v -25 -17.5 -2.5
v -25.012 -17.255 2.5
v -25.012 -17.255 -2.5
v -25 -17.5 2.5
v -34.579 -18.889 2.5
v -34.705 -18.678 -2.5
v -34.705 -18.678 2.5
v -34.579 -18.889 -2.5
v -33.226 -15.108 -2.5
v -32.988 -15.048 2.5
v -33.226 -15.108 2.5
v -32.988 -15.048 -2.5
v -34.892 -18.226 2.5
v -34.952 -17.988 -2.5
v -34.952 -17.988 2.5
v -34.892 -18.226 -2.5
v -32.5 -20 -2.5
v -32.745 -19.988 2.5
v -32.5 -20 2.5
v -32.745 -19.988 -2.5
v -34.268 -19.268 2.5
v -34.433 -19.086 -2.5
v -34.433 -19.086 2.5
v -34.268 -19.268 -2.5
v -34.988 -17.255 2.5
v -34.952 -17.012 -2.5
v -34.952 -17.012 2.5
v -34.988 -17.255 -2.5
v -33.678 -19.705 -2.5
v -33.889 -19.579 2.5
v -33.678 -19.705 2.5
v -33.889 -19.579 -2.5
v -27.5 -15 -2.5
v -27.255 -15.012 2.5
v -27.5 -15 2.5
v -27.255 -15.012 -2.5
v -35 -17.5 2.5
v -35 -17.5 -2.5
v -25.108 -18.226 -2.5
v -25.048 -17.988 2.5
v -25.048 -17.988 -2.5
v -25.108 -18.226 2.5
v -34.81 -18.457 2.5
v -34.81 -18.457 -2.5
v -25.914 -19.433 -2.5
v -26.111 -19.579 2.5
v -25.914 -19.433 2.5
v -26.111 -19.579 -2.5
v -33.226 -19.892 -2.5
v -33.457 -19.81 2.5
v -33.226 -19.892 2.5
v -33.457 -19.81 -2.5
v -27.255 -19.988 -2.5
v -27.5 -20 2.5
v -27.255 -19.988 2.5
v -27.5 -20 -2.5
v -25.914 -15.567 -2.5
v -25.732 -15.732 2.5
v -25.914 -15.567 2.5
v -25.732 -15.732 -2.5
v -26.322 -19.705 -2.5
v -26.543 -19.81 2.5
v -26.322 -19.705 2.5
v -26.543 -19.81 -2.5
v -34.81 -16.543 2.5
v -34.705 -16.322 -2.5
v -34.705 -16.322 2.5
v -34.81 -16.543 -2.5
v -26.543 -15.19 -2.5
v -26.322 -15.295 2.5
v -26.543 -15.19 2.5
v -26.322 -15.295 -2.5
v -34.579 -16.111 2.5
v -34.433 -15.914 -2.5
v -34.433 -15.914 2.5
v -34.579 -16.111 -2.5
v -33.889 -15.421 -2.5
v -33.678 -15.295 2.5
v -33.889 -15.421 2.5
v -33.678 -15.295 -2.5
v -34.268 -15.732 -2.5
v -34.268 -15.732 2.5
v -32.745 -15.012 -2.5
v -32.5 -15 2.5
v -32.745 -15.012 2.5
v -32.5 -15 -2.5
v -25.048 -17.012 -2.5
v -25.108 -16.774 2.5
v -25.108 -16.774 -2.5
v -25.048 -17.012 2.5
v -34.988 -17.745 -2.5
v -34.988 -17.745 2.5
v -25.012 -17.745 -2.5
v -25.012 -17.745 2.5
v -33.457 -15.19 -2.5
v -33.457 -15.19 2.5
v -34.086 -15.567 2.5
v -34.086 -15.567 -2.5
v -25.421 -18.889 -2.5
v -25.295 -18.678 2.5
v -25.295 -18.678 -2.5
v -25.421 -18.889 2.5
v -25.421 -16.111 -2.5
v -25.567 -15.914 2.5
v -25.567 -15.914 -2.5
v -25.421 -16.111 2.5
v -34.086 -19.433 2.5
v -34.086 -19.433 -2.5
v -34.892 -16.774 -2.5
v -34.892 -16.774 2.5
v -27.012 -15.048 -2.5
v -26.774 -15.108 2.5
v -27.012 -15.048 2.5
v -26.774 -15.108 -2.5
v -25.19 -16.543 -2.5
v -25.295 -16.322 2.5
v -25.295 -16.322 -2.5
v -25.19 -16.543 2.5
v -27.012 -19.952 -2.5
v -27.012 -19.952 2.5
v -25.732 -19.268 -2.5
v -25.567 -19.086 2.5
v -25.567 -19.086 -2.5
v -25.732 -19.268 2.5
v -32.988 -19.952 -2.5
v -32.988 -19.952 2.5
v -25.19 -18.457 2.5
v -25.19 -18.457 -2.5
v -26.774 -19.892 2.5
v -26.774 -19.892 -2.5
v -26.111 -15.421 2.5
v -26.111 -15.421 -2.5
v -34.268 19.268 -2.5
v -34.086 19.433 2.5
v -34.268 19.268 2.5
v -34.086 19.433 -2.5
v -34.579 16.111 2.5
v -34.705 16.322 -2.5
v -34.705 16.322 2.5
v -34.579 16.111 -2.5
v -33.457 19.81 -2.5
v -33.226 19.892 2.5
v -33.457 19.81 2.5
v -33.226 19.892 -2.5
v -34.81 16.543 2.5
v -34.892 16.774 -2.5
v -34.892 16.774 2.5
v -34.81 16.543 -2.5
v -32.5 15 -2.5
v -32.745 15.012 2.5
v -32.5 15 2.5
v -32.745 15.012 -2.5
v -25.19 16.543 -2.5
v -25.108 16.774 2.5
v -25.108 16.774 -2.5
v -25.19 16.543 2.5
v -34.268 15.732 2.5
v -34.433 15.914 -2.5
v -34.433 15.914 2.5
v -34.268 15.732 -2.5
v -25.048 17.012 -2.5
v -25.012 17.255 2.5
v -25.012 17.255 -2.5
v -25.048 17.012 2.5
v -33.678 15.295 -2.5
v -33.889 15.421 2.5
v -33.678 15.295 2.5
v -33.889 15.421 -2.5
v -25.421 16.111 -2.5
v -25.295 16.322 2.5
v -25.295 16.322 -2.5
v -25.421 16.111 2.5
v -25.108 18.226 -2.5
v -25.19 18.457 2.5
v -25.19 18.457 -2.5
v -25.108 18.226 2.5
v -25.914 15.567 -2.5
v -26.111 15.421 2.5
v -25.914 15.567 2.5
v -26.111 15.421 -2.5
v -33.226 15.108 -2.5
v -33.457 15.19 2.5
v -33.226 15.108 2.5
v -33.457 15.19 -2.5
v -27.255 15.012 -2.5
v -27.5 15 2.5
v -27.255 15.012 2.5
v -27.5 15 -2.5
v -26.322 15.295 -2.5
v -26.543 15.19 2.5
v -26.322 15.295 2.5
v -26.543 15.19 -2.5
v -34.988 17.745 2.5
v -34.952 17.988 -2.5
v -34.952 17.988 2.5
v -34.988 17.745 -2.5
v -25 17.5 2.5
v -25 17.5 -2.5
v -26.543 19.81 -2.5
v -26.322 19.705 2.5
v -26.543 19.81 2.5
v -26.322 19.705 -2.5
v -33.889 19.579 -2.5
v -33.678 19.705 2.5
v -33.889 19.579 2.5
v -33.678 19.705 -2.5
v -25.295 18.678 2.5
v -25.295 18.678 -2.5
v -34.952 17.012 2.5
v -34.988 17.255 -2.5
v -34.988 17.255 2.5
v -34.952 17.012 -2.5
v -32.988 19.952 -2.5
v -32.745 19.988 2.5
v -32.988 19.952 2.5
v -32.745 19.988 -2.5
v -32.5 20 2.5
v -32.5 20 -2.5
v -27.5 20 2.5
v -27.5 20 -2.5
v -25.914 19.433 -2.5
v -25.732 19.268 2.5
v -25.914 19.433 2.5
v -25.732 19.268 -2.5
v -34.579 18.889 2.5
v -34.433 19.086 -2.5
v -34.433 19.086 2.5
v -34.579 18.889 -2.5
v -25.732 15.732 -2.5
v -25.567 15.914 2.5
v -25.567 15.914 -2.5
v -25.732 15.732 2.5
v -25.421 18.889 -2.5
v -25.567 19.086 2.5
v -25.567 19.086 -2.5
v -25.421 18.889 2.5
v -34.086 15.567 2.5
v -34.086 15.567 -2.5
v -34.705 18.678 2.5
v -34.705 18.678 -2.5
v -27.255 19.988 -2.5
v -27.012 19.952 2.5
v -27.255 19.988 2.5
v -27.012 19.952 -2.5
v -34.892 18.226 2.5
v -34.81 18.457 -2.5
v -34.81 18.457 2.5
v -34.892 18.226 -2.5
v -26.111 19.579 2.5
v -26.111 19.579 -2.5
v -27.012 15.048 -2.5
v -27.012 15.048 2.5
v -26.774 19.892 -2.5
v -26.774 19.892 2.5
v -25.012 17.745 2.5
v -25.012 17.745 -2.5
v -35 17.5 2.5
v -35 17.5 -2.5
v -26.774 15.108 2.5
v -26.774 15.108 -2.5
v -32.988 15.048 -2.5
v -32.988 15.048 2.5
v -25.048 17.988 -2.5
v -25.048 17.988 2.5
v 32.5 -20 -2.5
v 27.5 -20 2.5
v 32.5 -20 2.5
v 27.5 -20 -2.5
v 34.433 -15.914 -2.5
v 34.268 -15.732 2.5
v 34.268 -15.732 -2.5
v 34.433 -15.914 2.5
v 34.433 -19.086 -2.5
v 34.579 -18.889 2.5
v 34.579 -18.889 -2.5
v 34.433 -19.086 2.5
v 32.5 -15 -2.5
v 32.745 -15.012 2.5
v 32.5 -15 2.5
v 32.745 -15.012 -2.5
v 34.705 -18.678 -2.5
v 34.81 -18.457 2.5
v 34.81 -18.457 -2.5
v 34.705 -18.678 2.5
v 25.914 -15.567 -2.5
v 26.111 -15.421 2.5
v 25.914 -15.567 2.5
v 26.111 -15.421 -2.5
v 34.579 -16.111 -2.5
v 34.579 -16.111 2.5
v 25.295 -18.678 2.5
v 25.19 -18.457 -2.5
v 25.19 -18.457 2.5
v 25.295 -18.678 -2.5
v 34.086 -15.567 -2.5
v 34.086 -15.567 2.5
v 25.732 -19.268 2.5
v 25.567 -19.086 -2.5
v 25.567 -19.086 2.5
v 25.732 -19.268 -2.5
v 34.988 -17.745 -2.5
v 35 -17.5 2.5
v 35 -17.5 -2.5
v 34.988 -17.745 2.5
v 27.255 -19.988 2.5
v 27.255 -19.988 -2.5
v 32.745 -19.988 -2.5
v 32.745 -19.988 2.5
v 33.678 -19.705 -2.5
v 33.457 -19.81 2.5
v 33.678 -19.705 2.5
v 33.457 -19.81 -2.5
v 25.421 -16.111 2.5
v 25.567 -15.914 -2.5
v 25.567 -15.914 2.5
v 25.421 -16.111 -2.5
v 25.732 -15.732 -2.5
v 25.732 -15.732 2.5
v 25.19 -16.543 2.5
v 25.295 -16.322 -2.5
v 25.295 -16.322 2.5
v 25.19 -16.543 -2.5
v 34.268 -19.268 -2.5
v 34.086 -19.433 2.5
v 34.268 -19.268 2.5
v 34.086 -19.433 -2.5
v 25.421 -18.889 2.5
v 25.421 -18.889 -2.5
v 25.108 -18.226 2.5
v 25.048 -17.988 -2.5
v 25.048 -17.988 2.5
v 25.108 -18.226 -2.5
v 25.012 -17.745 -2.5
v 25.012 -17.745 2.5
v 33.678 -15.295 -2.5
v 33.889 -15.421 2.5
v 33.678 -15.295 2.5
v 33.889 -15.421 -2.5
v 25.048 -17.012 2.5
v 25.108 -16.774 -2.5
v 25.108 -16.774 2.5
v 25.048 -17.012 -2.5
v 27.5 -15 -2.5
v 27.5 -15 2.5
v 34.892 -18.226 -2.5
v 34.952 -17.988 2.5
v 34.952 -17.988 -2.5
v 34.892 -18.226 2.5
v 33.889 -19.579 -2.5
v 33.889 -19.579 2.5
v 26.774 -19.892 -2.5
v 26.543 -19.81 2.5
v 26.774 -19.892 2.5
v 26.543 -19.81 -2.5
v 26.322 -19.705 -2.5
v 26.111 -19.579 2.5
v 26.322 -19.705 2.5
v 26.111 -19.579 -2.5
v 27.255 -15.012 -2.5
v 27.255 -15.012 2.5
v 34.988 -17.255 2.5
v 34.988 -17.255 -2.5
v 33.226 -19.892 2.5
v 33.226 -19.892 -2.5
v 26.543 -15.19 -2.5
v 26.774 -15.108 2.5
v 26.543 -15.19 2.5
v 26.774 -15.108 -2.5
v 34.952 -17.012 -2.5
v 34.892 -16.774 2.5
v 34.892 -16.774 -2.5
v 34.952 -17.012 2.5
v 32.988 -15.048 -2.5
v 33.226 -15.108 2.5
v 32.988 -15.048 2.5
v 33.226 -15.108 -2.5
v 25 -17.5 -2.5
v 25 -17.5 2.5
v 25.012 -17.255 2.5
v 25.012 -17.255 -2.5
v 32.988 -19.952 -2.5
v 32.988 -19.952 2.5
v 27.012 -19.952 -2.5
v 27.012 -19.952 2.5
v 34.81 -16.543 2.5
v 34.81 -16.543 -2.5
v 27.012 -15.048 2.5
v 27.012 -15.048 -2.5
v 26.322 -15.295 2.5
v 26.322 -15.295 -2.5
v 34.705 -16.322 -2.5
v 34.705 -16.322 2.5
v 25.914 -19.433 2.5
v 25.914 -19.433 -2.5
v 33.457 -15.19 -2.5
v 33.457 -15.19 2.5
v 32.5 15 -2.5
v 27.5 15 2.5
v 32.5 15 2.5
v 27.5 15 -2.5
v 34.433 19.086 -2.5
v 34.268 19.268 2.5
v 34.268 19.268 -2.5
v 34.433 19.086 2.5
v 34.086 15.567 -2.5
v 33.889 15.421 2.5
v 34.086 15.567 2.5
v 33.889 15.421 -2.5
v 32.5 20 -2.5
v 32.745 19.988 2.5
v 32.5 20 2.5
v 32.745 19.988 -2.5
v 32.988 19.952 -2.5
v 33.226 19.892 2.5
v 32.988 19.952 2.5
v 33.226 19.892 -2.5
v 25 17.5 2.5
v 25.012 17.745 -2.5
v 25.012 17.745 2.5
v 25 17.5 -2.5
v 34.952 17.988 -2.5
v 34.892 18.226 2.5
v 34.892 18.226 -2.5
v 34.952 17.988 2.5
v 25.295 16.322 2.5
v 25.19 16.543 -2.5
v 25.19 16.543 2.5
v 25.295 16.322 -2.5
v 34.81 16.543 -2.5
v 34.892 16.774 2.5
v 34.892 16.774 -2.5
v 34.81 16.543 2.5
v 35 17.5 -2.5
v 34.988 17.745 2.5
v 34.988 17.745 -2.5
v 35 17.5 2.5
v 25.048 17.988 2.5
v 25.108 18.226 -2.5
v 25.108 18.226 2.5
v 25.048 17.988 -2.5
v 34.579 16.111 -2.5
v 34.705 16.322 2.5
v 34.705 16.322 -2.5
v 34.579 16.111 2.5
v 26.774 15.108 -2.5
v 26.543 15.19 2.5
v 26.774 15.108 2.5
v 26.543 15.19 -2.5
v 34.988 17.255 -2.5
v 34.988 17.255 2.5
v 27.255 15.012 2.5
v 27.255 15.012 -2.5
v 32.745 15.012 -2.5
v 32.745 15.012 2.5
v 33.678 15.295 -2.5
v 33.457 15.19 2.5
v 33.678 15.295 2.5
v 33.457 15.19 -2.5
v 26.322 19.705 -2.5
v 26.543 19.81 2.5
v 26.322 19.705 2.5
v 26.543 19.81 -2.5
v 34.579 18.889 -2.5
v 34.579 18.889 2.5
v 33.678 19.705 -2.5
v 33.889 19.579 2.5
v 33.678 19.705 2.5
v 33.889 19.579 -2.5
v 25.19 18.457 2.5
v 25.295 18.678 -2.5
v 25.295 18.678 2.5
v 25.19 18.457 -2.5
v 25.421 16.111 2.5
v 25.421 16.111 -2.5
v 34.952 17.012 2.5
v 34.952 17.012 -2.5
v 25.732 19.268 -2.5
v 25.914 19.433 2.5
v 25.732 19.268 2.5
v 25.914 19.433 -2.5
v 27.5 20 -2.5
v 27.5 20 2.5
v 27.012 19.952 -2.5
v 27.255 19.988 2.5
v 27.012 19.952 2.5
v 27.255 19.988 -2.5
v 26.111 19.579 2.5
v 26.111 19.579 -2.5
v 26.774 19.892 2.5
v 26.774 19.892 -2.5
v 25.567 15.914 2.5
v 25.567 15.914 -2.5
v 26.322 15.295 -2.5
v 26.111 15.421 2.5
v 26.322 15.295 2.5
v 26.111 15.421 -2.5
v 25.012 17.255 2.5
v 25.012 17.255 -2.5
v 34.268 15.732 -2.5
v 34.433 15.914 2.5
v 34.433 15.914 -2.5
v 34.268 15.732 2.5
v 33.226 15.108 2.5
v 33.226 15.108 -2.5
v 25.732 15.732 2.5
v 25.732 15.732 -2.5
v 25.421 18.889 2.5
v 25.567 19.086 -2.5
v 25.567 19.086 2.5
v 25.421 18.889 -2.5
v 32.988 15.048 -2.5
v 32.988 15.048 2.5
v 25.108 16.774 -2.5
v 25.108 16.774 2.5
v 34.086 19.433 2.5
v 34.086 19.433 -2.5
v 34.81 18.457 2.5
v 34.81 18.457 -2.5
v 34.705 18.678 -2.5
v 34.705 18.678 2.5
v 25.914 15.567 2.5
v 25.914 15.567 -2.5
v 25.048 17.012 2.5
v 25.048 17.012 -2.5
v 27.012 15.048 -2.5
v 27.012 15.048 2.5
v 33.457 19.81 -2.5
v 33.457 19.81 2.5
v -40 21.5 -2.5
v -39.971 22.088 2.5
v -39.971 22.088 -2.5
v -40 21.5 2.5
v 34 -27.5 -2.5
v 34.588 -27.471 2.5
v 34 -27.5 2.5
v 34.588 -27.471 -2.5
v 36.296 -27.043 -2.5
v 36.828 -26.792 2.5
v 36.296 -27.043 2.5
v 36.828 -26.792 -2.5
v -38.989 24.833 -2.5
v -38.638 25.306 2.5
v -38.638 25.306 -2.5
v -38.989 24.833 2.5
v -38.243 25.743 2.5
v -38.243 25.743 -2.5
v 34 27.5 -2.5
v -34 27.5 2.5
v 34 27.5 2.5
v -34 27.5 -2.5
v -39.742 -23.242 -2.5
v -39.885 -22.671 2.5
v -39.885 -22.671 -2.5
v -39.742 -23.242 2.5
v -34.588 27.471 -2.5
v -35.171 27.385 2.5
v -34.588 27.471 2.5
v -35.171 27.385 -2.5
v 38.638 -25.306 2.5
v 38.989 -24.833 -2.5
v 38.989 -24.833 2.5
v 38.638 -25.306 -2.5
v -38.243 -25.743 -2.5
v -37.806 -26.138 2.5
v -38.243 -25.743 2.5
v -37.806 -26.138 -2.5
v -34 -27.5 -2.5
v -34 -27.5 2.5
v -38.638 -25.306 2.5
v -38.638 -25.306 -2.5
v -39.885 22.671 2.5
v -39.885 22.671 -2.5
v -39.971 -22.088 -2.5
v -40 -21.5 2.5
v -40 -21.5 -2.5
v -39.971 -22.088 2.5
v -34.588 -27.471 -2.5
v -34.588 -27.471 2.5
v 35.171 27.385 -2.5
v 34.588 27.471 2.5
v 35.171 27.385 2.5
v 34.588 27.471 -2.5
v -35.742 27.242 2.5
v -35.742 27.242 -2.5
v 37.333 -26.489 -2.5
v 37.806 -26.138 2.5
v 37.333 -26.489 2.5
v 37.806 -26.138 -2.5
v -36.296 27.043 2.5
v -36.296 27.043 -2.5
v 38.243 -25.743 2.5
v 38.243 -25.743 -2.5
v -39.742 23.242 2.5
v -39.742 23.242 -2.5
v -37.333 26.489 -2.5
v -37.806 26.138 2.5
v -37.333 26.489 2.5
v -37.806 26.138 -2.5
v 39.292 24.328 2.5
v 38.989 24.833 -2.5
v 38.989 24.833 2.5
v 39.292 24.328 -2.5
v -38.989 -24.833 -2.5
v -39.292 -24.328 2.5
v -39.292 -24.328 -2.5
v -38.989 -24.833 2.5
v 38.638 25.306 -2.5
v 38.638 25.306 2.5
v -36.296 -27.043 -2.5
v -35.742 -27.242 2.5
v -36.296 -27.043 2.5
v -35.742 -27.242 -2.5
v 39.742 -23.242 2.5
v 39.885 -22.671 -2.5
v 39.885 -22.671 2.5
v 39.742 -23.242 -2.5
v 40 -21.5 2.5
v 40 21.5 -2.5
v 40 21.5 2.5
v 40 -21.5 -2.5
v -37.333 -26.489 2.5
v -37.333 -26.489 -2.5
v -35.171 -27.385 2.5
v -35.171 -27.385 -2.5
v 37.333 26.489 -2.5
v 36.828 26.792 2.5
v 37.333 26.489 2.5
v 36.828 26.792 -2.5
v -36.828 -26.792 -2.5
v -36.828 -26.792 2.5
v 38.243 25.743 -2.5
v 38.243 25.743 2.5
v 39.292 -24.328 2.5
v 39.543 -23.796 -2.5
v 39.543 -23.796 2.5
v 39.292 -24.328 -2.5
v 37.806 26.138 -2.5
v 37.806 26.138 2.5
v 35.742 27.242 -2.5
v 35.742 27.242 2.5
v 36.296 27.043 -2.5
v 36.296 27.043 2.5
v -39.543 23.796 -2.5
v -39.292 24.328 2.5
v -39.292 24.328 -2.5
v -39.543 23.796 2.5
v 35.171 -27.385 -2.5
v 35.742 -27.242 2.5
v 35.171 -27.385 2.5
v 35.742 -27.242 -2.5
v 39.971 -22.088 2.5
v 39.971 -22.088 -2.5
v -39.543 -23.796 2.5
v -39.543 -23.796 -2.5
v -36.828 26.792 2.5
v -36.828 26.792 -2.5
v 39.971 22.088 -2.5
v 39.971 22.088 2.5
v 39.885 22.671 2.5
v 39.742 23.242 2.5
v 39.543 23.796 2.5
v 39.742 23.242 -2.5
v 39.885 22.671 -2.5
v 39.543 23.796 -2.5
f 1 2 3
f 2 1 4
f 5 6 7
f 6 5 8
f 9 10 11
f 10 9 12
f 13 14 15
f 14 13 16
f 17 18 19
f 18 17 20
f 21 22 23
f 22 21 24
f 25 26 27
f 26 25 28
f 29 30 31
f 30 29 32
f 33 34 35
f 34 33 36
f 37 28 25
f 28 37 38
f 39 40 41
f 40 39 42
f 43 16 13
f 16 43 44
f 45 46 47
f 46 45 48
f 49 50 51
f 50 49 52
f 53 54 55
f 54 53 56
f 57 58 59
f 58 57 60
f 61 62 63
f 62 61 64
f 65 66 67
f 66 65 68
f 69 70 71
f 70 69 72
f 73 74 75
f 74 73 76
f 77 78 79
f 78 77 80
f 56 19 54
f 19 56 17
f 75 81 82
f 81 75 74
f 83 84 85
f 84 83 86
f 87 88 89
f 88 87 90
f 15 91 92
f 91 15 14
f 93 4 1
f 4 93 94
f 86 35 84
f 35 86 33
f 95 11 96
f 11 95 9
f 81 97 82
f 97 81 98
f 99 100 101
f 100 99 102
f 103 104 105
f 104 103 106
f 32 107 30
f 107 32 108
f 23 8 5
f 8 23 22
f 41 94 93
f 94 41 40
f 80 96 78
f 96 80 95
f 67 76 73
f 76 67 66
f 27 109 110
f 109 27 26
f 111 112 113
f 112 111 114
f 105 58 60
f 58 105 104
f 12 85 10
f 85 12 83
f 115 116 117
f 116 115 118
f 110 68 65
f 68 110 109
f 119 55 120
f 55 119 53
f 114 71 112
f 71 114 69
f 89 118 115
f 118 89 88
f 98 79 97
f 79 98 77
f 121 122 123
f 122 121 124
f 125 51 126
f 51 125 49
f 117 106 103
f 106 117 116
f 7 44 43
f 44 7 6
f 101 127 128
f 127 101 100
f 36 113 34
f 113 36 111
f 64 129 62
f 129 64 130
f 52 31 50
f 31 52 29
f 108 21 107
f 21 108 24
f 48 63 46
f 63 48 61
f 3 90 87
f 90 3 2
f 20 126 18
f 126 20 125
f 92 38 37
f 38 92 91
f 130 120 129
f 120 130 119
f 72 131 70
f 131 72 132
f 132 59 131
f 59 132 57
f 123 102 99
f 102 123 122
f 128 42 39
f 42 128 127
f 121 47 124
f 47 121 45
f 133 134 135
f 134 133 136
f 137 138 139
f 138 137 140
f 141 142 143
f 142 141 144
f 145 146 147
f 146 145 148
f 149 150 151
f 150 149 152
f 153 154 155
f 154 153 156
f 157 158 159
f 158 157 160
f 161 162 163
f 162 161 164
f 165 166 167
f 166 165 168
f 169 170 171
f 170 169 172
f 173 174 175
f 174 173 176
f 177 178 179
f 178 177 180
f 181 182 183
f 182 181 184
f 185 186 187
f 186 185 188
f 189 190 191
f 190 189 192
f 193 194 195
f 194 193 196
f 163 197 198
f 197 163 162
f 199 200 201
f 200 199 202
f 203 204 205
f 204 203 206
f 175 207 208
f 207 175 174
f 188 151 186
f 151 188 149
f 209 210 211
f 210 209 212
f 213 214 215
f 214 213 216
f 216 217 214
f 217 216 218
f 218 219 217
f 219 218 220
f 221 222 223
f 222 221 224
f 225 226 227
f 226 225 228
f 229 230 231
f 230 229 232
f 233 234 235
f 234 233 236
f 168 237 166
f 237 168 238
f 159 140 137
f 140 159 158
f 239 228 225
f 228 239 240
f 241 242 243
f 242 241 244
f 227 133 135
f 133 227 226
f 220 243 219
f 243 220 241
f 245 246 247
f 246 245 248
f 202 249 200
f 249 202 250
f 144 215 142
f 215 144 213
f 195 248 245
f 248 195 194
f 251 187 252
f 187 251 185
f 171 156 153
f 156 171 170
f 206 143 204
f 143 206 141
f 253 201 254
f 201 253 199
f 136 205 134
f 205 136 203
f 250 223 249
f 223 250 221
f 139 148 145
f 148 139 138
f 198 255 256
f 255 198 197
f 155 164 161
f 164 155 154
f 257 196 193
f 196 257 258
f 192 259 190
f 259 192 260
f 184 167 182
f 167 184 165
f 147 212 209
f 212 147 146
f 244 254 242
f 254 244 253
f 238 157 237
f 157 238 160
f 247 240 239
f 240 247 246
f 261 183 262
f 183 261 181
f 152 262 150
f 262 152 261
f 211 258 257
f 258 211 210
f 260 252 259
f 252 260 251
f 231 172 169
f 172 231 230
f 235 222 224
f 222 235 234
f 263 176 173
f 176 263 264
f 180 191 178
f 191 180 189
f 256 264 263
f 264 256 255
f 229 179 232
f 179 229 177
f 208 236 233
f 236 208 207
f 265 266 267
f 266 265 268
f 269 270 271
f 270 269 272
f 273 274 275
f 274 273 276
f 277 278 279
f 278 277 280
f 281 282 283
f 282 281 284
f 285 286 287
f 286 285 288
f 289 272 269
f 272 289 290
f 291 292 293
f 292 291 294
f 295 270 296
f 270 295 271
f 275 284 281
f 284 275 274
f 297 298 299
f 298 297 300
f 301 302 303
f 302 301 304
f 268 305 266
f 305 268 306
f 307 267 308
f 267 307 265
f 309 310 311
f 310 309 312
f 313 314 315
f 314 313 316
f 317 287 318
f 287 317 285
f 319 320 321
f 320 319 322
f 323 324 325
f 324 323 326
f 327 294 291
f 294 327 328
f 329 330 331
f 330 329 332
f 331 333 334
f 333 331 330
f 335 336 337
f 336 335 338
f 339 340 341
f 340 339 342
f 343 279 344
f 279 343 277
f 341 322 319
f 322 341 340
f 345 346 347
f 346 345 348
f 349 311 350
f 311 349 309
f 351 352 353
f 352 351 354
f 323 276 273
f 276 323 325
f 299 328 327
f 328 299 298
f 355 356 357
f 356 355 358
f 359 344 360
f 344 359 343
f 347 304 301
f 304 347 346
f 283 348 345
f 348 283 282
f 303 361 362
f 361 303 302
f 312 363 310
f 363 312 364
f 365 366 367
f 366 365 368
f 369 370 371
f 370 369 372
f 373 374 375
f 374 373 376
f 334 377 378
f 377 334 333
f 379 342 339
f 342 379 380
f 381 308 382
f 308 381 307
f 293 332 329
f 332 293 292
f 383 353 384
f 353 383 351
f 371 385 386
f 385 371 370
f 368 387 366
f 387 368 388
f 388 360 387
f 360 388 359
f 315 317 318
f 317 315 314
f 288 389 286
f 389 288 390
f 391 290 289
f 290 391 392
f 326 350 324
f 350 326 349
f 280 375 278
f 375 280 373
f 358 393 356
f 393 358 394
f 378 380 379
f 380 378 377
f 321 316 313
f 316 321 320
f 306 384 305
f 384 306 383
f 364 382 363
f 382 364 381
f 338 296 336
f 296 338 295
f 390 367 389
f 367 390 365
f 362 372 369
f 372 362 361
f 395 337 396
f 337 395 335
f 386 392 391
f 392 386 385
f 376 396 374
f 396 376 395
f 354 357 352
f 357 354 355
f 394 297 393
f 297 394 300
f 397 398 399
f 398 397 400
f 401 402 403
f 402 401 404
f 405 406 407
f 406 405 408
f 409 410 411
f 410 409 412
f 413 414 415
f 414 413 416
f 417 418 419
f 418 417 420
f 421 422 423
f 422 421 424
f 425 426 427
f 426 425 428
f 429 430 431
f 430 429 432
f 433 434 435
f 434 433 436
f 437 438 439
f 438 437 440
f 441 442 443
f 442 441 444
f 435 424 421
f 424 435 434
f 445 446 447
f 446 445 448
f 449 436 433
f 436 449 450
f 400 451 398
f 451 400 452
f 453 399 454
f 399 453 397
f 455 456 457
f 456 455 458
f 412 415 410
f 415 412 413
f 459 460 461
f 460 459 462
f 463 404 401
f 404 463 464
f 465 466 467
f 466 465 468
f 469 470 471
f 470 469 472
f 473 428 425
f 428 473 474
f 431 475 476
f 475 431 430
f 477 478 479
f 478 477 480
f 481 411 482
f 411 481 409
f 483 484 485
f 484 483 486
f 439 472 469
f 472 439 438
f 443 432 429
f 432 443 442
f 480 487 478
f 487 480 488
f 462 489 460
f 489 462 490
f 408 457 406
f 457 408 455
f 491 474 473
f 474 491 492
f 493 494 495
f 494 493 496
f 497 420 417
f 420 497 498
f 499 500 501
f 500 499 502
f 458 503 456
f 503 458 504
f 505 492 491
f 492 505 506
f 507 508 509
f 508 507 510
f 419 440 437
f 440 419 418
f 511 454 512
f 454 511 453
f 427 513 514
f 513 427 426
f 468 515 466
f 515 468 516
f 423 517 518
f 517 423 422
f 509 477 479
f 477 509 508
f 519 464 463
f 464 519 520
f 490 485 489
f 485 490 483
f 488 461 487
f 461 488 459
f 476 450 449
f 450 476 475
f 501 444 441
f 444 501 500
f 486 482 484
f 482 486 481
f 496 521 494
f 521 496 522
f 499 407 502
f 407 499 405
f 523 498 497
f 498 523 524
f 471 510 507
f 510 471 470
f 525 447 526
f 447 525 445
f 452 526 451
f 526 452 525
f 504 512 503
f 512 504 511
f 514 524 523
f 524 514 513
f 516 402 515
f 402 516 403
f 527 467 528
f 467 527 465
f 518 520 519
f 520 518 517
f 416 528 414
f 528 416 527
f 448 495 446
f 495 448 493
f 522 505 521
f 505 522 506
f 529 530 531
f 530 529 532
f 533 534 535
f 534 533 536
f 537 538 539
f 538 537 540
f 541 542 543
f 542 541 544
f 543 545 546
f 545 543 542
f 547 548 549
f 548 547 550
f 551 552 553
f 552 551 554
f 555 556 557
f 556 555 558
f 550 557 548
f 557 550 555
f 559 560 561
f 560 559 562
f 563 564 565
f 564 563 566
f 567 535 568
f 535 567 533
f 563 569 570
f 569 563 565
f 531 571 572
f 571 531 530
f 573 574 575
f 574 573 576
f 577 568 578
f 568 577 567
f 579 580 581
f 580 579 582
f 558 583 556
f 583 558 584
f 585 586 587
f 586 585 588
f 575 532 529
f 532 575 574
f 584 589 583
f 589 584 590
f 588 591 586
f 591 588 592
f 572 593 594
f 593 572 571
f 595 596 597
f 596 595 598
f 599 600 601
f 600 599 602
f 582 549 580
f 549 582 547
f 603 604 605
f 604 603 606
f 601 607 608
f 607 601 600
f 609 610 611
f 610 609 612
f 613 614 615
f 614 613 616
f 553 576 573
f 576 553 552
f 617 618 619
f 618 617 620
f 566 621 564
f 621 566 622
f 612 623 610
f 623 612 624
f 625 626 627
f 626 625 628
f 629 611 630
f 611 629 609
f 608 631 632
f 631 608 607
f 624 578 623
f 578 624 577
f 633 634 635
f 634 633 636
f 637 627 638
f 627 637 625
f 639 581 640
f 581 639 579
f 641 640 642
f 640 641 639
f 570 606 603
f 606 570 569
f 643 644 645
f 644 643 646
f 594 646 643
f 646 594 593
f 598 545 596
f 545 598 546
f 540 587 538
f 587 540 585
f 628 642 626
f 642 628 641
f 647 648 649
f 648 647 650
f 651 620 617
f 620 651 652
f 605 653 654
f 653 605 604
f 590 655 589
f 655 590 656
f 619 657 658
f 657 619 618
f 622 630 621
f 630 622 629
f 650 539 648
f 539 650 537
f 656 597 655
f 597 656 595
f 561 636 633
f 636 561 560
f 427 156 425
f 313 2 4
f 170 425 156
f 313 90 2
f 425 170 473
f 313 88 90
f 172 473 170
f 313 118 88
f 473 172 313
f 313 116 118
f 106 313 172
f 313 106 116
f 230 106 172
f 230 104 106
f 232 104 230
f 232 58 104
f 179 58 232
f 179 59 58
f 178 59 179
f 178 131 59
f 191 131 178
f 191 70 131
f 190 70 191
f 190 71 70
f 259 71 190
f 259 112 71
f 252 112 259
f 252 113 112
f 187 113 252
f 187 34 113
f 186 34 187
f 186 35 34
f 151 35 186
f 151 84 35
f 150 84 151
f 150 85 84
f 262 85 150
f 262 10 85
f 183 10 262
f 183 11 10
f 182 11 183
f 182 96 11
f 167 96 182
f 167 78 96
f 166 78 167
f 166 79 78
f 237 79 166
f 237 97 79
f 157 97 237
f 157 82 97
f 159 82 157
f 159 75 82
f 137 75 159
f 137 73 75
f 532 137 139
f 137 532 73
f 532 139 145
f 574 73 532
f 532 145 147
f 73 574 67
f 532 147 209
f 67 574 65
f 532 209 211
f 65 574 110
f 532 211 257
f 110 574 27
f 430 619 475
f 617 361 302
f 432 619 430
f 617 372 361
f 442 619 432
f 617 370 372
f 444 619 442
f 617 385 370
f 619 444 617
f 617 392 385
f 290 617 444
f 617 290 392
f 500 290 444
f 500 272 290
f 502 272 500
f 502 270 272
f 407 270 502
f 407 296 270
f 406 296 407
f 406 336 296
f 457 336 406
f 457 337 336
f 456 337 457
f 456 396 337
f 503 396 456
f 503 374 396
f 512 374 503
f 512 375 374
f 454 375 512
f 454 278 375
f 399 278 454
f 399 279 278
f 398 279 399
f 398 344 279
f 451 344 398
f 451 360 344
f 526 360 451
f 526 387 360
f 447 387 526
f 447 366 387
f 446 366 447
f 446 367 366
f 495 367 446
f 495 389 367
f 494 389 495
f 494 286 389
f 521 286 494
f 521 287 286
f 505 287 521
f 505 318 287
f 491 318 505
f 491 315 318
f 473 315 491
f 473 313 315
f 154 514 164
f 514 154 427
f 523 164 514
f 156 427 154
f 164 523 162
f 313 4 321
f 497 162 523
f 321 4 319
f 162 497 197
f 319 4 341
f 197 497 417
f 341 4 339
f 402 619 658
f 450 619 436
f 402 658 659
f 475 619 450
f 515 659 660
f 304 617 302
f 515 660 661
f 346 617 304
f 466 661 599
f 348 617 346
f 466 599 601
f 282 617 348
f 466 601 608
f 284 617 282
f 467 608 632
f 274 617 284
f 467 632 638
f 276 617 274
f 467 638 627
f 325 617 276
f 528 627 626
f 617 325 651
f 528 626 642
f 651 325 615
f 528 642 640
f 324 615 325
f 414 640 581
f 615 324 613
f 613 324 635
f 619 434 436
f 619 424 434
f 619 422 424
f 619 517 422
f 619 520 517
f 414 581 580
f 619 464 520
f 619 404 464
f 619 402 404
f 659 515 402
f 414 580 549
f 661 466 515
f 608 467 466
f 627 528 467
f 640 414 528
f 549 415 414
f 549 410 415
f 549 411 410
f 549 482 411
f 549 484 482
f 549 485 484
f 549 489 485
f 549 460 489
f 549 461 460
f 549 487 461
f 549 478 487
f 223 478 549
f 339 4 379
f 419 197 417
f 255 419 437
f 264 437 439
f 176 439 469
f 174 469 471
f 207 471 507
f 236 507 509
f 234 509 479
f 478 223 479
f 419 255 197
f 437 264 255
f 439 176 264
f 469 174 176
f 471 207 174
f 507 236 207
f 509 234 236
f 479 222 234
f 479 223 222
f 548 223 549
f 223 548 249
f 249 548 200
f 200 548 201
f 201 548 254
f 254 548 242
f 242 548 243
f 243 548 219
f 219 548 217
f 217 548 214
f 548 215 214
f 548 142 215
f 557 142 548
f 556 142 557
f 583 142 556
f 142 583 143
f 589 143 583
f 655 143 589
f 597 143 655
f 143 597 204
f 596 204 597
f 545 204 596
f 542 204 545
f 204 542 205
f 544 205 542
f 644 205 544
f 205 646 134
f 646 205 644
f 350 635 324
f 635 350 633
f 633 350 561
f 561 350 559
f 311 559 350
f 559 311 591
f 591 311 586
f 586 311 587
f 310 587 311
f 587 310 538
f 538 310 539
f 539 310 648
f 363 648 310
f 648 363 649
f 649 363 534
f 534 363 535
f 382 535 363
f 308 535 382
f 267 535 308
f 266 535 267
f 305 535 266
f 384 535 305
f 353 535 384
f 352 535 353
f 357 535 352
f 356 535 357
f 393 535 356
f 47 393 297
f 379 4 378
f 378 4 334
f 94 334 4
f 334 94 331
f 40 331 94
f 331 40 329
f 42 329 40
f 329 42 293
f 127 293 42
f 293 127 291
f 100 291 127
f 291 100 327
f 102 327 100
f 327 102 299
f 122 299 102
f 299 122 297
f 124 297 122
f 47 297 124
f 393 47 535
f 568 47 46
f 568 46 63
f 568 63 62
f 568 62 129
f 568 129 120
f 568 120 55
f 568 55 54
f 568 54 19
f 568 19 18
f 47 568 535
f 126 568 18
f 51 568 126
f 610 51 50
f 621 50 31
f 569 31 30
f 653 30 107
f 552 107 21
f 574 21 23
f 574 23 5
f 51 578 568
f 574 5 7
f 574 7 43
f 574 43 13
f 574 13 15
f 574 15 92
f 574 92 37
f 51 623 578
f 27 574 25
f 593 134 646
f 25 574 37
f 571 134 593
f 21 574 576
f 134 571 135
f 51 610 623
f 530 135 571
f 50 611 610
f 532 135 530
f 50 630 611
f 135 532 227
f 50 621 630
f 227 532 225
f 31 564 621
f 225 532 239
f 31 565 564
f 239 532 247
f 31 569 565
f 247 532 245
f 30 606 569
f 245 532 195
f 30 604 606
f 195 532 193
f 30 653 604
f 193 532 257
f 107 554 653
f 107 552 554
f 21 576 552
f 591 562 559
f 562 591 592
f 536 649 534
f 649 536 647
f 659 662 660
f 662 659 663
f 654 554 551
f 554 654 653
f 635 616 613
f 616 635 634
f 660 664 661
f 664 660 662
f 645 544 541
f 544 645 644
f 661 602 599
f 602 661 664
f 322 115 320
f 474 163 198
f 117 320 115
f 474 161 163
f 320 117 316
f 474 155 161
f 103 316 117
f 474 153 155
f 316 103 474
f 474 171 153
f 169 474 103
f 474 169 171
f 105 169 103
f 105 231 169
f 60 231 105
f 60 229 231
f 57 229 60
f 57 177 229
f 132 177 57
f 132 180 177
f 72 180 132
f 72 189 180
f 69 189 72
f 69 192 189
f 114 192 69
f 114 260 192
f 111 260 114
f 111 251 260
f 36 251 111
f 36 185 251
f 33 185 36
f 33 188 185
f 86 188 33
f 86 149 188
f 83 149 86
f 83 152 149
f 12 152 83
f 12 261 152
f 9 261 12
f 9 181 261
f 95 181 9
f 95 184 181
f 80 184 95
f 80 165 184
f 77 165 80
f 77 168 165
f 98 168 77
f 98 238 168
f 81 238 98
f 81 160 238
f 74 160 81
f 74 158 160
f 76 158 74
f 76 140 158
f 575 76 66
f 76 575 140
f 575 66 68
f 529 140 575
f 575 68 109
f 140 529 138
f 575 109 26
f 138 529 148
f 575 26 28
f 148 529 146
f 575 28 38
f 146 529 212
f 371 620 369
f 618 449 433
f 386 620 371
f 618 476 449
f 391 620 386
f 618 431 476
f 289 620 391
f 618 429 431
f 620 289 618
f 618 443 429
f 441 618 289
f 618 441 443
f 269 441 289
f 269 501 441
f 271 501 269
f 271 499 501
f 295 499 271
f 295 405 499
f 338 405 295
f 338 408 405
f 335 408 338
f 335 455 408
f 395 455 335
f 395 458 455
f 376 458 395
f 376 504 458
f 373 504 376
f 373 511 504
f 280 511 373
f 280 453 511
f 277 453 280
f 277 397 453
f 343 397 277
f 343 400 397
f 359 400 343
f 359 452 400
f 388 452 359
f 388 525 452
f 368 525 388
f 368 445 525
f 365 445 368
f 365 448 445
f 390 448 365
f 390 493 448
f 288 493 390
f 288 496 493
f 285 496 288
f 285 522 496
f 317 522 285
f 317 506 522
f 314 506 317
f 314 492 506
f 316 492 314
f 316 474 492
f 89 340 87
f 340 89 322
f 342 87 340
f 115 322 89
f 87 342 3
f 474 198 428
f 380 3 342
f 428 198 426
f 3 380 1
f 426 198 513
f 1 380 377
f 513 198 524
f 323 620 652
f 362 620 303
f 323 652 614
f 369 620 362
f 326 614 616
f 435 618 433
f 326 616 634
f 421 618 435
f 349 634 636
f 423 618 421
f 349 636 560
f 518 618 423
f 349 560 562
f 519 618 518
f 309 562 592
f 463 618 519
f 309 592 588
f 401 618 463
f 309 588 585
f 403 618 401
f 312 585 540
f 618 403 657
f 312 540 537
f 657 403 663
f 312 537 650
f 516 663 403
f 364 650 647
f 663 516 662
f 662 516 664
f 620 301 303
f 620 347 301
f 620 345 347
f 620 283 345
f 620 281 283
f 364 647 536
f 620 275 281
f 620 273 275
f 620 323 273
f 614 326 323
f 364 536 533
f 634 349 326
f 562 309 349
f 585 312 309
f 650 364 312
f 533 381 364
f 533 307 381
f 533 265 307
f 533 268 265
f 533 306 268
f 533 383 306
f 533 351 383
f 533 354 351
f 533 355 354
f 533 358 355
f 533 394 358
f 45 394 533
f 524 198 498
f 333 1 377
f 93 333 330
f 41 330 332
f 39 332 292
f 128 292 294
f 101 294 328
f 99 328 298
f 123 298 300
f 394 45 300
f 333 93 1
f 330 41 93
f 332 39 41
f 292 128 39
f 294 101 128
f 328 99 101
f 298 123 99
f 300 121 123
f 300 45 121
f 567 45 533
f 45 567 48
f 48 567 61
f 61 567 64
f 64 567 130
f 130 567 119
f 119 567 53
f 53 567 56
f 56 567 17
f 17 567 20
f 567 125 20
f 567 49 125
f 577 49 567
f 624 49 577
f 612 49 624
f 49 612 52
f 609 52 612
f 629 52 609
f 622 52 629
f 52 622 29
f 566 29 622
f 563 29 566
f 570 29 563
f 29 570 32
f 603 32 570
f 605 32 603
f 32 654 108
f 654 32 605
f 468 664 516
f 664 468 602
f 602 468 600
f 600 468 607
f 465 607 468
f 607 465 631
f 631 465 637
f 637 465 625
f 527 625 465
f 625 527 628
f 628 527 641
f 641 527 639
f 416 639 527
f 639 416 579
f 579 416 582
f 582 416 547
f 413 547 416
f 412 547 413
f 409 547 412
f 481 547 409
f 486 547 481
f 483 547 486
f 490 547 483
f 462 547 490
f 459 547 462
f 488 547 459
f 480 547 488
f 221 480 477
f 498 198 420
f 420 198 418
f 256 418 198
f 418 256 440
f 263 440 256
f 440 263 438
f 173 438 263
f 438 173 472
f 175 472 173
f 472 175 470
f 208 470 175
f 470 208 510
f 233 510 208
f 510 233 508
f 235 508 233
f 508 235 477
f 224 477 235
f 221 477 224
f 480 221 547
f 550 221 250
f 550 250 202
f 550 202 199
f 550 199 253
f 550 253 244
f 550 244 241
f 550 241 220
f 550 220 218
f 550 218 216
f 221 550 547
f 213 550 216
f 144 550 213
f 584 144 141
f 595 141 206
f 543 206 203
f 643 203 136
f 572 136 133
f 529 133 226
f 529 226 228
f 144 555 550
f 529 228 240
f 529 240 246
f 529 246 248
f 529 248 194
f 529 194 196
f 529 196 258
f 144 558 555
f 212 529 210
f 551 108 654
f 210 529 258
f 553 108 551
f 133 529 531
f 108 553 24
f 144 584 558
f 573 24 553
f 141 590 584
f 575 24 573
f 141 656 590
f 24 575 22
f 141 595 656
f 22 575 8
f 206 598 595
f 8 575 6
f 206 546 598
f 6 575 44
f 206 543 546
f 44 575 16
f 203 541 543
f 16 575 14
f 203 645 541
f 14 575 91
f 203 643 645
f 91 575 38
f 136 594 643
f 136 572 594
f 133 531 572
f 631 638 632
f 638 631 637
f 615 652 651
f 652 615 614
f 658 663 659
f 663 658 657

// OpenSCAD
// file: ../toolbox.scad
// Reusable geometry and layout modules for the projects in this repository.
// All dimensions are in millimetres.

module tb_rounded_rect_2d(width = 50, length = 50, radius = 5) {
assert(width > 0, "Width must be greater than zero.");
assert(length > 0, "Length must be greater than zero.");
assert(radius >= 0, "Corner radius cannot be negative.");
assert(radius <= min(width, length) / 2,
"Corner radius is too large for these dimensions.");

if (radius > 0) {
    offset(r = radius)
        square(
            [width - 2 * radius, length - 2 * radius],
            center = true
        );
} else {
    square([width, length], center = true);
}

}

module tb_rounded_solid(
width = 50,
length = 50,
height = 5,
radius = 5,
center = true
) {
assert(height > 0, "Height must be greater than zero.");

linear_extrude(height = height, center = center)
    tb_rounded_rect_2d(
        width = width,
        length = length,
        radius = radius
    );

}

module tb_rounded_ring(
width = 50,
length = 50,
height = 5,
radius = 5,
wall = 2,
center = true,
epsilon = 0.02
) {
assert(wall > 0, "Wall thickness must be greater than zero.");
assert(width > 2 * wall, "Wall is too large for the width.");
assert(length > 2 * wall, "Wall is too large for the length.");

difference() {
    tb_rounded_solid(
        width = width,
        length = length,
        height = height,
        radius = radius,
        center = center
    );

    tb_rounded_solid(
        width = width - 2 * wall,
        length = length - 2 * wall,
        height = height + 2 * epsilon,
        radius = max(radius - wall, 0),
        center = center
    );
}

}

// slot_length is the complete external length of the slot.
module tb_slot_hole(
diameter = 5,
height = 10,
slot_length = 10,
angle = 0
) {
assert(diameter > 0, "Hole diameter must be greater than zero.");
assert(height > 0, "Hole height must be greater than zero.");
assert(slot_length >= diameter,
"Slot length must be at least equal to its diameter.");

center_distance = slot_length - diameter;

rotate([0, 0, angle])
    hull() {
        translate([-center_distance / 2, 0, 0])
            cylinder(
                h = height,
                d = diameter,
                center = true
            );

        translate([center_distance / 2, 0, 0])
            cylinder(
                h = height,
                d = diameter,
                center = true
            );
    }

}

// Places children at four points separated by x_distance and y_distance.
module tb_pattern_4_corners(x_distance = 40, y_distance = 40) {
for (x = [-x_distance / 2, x_distance / 2])
for (y = [-y_distance / 2, y_distance / 2])
translate([x, y, 0])
children();
}

// Places children around a bolt circle or any other circular pattern.
module tb_pattern_circular(count = 4, diameter = 40, start_angle = 0) {
assert(count >= 1, "Pattern count must be at least one.");
assert(diameter >= 0, "Pattern diameter cannot be negative.");

for (index = [0 : count - 1]) {
    angle = start_angle + index * 360 / count;

    rotate([0, 0, angle])
        translate([diameter / 2, 0, 0])
            children();
}

}

// Creates an open enclosure while preserving a defined floor thickness.
module tb_hollow_enclosure(
width = 60,
length = 60,
height = 30,
wall = 2,
floor = 2,
radius = 4,
epsilon = 0.02
) {
assert(wall > 0, "Wall thickness must be greater than zero.");
assert(floor > 0, "Floor thickness must be greater than zero.");
assert(width > 2 * wall, "Wall is too large for the width.");
assert(length > 2 * wall, "Wall is too large for the length.");
assert(height > floor, "Height must be greater than floor thickness.");

difference() {
    tb_rounded_solid(
        width = width,
        length = length,
        height = height,
        radius = radius,
        center = false
    );

    translate([0, 0, floor])
        tb_rounded_solid(
            width = width - 2 * wall,
            length = length - 2 * wall,
            height = height - floor + epsilon,
            radius = max(radius - wall, 0),
            center = false
        );
}

}
// main file
/*
Parametric mounting plate generator

Creates a rectangular mounting plate with rounded corners and
four configurable mounting holes.

Author: Lourenço Guerreiro
Units: millimetres

*/

use <../toolbox.scad>

$fn = 64;

plate_width = 80;
plate_length = 55;
plate_thickness = 5;
corner_radius = 6;

hole_diameter = 5;
slot_length = 10;
slot_angle = 0;

hole_offset_x = 10;
hole_offset_y = 10;

epsilon = 0.02;

module mounting_plate() {
pattern_width = plate_width - 2 * hole_offset_x;
pattern_length = plate_length - 2 * hole_offset_y;

assert(plate_width > 0,
       "Plate width must be greater than zero.");

assert(plate_length > 0,
       "Plate length must be greater than zero.");

assert(plate_thickness > 0,
       "Plate thickness must be greater than zero.");

assert(hole_offset_x >= slot_length / 2,
       "The holes are too close to the left or right edge.");

assert(hole_offset_y >= hole_diameter / 2,
       "The holes are too close to the top or bottom edge.");

assert(pattern_width >= 0,
       "Horizontal hole offset is too large.");

assert(pattern_length >= 0,
       "Vertical hole offset is too large.");

difference() {
    tb_rounded_solid(
        width = plate_width,
        length = plate_length,
        height = plate_thickness,
        radius = corner_radius
    );

    tb_pattern_4_corners(
        x_distance = pattern_width,
        y_distance = pattern_length
    )
        tb_slot_hole(
            diameter = hole_diameter,
            height = plate_thickness + 2 * epsilon,
            slot_length = slot_length,
            angle = slot_angle
        );
}

}

mounting_plate();
